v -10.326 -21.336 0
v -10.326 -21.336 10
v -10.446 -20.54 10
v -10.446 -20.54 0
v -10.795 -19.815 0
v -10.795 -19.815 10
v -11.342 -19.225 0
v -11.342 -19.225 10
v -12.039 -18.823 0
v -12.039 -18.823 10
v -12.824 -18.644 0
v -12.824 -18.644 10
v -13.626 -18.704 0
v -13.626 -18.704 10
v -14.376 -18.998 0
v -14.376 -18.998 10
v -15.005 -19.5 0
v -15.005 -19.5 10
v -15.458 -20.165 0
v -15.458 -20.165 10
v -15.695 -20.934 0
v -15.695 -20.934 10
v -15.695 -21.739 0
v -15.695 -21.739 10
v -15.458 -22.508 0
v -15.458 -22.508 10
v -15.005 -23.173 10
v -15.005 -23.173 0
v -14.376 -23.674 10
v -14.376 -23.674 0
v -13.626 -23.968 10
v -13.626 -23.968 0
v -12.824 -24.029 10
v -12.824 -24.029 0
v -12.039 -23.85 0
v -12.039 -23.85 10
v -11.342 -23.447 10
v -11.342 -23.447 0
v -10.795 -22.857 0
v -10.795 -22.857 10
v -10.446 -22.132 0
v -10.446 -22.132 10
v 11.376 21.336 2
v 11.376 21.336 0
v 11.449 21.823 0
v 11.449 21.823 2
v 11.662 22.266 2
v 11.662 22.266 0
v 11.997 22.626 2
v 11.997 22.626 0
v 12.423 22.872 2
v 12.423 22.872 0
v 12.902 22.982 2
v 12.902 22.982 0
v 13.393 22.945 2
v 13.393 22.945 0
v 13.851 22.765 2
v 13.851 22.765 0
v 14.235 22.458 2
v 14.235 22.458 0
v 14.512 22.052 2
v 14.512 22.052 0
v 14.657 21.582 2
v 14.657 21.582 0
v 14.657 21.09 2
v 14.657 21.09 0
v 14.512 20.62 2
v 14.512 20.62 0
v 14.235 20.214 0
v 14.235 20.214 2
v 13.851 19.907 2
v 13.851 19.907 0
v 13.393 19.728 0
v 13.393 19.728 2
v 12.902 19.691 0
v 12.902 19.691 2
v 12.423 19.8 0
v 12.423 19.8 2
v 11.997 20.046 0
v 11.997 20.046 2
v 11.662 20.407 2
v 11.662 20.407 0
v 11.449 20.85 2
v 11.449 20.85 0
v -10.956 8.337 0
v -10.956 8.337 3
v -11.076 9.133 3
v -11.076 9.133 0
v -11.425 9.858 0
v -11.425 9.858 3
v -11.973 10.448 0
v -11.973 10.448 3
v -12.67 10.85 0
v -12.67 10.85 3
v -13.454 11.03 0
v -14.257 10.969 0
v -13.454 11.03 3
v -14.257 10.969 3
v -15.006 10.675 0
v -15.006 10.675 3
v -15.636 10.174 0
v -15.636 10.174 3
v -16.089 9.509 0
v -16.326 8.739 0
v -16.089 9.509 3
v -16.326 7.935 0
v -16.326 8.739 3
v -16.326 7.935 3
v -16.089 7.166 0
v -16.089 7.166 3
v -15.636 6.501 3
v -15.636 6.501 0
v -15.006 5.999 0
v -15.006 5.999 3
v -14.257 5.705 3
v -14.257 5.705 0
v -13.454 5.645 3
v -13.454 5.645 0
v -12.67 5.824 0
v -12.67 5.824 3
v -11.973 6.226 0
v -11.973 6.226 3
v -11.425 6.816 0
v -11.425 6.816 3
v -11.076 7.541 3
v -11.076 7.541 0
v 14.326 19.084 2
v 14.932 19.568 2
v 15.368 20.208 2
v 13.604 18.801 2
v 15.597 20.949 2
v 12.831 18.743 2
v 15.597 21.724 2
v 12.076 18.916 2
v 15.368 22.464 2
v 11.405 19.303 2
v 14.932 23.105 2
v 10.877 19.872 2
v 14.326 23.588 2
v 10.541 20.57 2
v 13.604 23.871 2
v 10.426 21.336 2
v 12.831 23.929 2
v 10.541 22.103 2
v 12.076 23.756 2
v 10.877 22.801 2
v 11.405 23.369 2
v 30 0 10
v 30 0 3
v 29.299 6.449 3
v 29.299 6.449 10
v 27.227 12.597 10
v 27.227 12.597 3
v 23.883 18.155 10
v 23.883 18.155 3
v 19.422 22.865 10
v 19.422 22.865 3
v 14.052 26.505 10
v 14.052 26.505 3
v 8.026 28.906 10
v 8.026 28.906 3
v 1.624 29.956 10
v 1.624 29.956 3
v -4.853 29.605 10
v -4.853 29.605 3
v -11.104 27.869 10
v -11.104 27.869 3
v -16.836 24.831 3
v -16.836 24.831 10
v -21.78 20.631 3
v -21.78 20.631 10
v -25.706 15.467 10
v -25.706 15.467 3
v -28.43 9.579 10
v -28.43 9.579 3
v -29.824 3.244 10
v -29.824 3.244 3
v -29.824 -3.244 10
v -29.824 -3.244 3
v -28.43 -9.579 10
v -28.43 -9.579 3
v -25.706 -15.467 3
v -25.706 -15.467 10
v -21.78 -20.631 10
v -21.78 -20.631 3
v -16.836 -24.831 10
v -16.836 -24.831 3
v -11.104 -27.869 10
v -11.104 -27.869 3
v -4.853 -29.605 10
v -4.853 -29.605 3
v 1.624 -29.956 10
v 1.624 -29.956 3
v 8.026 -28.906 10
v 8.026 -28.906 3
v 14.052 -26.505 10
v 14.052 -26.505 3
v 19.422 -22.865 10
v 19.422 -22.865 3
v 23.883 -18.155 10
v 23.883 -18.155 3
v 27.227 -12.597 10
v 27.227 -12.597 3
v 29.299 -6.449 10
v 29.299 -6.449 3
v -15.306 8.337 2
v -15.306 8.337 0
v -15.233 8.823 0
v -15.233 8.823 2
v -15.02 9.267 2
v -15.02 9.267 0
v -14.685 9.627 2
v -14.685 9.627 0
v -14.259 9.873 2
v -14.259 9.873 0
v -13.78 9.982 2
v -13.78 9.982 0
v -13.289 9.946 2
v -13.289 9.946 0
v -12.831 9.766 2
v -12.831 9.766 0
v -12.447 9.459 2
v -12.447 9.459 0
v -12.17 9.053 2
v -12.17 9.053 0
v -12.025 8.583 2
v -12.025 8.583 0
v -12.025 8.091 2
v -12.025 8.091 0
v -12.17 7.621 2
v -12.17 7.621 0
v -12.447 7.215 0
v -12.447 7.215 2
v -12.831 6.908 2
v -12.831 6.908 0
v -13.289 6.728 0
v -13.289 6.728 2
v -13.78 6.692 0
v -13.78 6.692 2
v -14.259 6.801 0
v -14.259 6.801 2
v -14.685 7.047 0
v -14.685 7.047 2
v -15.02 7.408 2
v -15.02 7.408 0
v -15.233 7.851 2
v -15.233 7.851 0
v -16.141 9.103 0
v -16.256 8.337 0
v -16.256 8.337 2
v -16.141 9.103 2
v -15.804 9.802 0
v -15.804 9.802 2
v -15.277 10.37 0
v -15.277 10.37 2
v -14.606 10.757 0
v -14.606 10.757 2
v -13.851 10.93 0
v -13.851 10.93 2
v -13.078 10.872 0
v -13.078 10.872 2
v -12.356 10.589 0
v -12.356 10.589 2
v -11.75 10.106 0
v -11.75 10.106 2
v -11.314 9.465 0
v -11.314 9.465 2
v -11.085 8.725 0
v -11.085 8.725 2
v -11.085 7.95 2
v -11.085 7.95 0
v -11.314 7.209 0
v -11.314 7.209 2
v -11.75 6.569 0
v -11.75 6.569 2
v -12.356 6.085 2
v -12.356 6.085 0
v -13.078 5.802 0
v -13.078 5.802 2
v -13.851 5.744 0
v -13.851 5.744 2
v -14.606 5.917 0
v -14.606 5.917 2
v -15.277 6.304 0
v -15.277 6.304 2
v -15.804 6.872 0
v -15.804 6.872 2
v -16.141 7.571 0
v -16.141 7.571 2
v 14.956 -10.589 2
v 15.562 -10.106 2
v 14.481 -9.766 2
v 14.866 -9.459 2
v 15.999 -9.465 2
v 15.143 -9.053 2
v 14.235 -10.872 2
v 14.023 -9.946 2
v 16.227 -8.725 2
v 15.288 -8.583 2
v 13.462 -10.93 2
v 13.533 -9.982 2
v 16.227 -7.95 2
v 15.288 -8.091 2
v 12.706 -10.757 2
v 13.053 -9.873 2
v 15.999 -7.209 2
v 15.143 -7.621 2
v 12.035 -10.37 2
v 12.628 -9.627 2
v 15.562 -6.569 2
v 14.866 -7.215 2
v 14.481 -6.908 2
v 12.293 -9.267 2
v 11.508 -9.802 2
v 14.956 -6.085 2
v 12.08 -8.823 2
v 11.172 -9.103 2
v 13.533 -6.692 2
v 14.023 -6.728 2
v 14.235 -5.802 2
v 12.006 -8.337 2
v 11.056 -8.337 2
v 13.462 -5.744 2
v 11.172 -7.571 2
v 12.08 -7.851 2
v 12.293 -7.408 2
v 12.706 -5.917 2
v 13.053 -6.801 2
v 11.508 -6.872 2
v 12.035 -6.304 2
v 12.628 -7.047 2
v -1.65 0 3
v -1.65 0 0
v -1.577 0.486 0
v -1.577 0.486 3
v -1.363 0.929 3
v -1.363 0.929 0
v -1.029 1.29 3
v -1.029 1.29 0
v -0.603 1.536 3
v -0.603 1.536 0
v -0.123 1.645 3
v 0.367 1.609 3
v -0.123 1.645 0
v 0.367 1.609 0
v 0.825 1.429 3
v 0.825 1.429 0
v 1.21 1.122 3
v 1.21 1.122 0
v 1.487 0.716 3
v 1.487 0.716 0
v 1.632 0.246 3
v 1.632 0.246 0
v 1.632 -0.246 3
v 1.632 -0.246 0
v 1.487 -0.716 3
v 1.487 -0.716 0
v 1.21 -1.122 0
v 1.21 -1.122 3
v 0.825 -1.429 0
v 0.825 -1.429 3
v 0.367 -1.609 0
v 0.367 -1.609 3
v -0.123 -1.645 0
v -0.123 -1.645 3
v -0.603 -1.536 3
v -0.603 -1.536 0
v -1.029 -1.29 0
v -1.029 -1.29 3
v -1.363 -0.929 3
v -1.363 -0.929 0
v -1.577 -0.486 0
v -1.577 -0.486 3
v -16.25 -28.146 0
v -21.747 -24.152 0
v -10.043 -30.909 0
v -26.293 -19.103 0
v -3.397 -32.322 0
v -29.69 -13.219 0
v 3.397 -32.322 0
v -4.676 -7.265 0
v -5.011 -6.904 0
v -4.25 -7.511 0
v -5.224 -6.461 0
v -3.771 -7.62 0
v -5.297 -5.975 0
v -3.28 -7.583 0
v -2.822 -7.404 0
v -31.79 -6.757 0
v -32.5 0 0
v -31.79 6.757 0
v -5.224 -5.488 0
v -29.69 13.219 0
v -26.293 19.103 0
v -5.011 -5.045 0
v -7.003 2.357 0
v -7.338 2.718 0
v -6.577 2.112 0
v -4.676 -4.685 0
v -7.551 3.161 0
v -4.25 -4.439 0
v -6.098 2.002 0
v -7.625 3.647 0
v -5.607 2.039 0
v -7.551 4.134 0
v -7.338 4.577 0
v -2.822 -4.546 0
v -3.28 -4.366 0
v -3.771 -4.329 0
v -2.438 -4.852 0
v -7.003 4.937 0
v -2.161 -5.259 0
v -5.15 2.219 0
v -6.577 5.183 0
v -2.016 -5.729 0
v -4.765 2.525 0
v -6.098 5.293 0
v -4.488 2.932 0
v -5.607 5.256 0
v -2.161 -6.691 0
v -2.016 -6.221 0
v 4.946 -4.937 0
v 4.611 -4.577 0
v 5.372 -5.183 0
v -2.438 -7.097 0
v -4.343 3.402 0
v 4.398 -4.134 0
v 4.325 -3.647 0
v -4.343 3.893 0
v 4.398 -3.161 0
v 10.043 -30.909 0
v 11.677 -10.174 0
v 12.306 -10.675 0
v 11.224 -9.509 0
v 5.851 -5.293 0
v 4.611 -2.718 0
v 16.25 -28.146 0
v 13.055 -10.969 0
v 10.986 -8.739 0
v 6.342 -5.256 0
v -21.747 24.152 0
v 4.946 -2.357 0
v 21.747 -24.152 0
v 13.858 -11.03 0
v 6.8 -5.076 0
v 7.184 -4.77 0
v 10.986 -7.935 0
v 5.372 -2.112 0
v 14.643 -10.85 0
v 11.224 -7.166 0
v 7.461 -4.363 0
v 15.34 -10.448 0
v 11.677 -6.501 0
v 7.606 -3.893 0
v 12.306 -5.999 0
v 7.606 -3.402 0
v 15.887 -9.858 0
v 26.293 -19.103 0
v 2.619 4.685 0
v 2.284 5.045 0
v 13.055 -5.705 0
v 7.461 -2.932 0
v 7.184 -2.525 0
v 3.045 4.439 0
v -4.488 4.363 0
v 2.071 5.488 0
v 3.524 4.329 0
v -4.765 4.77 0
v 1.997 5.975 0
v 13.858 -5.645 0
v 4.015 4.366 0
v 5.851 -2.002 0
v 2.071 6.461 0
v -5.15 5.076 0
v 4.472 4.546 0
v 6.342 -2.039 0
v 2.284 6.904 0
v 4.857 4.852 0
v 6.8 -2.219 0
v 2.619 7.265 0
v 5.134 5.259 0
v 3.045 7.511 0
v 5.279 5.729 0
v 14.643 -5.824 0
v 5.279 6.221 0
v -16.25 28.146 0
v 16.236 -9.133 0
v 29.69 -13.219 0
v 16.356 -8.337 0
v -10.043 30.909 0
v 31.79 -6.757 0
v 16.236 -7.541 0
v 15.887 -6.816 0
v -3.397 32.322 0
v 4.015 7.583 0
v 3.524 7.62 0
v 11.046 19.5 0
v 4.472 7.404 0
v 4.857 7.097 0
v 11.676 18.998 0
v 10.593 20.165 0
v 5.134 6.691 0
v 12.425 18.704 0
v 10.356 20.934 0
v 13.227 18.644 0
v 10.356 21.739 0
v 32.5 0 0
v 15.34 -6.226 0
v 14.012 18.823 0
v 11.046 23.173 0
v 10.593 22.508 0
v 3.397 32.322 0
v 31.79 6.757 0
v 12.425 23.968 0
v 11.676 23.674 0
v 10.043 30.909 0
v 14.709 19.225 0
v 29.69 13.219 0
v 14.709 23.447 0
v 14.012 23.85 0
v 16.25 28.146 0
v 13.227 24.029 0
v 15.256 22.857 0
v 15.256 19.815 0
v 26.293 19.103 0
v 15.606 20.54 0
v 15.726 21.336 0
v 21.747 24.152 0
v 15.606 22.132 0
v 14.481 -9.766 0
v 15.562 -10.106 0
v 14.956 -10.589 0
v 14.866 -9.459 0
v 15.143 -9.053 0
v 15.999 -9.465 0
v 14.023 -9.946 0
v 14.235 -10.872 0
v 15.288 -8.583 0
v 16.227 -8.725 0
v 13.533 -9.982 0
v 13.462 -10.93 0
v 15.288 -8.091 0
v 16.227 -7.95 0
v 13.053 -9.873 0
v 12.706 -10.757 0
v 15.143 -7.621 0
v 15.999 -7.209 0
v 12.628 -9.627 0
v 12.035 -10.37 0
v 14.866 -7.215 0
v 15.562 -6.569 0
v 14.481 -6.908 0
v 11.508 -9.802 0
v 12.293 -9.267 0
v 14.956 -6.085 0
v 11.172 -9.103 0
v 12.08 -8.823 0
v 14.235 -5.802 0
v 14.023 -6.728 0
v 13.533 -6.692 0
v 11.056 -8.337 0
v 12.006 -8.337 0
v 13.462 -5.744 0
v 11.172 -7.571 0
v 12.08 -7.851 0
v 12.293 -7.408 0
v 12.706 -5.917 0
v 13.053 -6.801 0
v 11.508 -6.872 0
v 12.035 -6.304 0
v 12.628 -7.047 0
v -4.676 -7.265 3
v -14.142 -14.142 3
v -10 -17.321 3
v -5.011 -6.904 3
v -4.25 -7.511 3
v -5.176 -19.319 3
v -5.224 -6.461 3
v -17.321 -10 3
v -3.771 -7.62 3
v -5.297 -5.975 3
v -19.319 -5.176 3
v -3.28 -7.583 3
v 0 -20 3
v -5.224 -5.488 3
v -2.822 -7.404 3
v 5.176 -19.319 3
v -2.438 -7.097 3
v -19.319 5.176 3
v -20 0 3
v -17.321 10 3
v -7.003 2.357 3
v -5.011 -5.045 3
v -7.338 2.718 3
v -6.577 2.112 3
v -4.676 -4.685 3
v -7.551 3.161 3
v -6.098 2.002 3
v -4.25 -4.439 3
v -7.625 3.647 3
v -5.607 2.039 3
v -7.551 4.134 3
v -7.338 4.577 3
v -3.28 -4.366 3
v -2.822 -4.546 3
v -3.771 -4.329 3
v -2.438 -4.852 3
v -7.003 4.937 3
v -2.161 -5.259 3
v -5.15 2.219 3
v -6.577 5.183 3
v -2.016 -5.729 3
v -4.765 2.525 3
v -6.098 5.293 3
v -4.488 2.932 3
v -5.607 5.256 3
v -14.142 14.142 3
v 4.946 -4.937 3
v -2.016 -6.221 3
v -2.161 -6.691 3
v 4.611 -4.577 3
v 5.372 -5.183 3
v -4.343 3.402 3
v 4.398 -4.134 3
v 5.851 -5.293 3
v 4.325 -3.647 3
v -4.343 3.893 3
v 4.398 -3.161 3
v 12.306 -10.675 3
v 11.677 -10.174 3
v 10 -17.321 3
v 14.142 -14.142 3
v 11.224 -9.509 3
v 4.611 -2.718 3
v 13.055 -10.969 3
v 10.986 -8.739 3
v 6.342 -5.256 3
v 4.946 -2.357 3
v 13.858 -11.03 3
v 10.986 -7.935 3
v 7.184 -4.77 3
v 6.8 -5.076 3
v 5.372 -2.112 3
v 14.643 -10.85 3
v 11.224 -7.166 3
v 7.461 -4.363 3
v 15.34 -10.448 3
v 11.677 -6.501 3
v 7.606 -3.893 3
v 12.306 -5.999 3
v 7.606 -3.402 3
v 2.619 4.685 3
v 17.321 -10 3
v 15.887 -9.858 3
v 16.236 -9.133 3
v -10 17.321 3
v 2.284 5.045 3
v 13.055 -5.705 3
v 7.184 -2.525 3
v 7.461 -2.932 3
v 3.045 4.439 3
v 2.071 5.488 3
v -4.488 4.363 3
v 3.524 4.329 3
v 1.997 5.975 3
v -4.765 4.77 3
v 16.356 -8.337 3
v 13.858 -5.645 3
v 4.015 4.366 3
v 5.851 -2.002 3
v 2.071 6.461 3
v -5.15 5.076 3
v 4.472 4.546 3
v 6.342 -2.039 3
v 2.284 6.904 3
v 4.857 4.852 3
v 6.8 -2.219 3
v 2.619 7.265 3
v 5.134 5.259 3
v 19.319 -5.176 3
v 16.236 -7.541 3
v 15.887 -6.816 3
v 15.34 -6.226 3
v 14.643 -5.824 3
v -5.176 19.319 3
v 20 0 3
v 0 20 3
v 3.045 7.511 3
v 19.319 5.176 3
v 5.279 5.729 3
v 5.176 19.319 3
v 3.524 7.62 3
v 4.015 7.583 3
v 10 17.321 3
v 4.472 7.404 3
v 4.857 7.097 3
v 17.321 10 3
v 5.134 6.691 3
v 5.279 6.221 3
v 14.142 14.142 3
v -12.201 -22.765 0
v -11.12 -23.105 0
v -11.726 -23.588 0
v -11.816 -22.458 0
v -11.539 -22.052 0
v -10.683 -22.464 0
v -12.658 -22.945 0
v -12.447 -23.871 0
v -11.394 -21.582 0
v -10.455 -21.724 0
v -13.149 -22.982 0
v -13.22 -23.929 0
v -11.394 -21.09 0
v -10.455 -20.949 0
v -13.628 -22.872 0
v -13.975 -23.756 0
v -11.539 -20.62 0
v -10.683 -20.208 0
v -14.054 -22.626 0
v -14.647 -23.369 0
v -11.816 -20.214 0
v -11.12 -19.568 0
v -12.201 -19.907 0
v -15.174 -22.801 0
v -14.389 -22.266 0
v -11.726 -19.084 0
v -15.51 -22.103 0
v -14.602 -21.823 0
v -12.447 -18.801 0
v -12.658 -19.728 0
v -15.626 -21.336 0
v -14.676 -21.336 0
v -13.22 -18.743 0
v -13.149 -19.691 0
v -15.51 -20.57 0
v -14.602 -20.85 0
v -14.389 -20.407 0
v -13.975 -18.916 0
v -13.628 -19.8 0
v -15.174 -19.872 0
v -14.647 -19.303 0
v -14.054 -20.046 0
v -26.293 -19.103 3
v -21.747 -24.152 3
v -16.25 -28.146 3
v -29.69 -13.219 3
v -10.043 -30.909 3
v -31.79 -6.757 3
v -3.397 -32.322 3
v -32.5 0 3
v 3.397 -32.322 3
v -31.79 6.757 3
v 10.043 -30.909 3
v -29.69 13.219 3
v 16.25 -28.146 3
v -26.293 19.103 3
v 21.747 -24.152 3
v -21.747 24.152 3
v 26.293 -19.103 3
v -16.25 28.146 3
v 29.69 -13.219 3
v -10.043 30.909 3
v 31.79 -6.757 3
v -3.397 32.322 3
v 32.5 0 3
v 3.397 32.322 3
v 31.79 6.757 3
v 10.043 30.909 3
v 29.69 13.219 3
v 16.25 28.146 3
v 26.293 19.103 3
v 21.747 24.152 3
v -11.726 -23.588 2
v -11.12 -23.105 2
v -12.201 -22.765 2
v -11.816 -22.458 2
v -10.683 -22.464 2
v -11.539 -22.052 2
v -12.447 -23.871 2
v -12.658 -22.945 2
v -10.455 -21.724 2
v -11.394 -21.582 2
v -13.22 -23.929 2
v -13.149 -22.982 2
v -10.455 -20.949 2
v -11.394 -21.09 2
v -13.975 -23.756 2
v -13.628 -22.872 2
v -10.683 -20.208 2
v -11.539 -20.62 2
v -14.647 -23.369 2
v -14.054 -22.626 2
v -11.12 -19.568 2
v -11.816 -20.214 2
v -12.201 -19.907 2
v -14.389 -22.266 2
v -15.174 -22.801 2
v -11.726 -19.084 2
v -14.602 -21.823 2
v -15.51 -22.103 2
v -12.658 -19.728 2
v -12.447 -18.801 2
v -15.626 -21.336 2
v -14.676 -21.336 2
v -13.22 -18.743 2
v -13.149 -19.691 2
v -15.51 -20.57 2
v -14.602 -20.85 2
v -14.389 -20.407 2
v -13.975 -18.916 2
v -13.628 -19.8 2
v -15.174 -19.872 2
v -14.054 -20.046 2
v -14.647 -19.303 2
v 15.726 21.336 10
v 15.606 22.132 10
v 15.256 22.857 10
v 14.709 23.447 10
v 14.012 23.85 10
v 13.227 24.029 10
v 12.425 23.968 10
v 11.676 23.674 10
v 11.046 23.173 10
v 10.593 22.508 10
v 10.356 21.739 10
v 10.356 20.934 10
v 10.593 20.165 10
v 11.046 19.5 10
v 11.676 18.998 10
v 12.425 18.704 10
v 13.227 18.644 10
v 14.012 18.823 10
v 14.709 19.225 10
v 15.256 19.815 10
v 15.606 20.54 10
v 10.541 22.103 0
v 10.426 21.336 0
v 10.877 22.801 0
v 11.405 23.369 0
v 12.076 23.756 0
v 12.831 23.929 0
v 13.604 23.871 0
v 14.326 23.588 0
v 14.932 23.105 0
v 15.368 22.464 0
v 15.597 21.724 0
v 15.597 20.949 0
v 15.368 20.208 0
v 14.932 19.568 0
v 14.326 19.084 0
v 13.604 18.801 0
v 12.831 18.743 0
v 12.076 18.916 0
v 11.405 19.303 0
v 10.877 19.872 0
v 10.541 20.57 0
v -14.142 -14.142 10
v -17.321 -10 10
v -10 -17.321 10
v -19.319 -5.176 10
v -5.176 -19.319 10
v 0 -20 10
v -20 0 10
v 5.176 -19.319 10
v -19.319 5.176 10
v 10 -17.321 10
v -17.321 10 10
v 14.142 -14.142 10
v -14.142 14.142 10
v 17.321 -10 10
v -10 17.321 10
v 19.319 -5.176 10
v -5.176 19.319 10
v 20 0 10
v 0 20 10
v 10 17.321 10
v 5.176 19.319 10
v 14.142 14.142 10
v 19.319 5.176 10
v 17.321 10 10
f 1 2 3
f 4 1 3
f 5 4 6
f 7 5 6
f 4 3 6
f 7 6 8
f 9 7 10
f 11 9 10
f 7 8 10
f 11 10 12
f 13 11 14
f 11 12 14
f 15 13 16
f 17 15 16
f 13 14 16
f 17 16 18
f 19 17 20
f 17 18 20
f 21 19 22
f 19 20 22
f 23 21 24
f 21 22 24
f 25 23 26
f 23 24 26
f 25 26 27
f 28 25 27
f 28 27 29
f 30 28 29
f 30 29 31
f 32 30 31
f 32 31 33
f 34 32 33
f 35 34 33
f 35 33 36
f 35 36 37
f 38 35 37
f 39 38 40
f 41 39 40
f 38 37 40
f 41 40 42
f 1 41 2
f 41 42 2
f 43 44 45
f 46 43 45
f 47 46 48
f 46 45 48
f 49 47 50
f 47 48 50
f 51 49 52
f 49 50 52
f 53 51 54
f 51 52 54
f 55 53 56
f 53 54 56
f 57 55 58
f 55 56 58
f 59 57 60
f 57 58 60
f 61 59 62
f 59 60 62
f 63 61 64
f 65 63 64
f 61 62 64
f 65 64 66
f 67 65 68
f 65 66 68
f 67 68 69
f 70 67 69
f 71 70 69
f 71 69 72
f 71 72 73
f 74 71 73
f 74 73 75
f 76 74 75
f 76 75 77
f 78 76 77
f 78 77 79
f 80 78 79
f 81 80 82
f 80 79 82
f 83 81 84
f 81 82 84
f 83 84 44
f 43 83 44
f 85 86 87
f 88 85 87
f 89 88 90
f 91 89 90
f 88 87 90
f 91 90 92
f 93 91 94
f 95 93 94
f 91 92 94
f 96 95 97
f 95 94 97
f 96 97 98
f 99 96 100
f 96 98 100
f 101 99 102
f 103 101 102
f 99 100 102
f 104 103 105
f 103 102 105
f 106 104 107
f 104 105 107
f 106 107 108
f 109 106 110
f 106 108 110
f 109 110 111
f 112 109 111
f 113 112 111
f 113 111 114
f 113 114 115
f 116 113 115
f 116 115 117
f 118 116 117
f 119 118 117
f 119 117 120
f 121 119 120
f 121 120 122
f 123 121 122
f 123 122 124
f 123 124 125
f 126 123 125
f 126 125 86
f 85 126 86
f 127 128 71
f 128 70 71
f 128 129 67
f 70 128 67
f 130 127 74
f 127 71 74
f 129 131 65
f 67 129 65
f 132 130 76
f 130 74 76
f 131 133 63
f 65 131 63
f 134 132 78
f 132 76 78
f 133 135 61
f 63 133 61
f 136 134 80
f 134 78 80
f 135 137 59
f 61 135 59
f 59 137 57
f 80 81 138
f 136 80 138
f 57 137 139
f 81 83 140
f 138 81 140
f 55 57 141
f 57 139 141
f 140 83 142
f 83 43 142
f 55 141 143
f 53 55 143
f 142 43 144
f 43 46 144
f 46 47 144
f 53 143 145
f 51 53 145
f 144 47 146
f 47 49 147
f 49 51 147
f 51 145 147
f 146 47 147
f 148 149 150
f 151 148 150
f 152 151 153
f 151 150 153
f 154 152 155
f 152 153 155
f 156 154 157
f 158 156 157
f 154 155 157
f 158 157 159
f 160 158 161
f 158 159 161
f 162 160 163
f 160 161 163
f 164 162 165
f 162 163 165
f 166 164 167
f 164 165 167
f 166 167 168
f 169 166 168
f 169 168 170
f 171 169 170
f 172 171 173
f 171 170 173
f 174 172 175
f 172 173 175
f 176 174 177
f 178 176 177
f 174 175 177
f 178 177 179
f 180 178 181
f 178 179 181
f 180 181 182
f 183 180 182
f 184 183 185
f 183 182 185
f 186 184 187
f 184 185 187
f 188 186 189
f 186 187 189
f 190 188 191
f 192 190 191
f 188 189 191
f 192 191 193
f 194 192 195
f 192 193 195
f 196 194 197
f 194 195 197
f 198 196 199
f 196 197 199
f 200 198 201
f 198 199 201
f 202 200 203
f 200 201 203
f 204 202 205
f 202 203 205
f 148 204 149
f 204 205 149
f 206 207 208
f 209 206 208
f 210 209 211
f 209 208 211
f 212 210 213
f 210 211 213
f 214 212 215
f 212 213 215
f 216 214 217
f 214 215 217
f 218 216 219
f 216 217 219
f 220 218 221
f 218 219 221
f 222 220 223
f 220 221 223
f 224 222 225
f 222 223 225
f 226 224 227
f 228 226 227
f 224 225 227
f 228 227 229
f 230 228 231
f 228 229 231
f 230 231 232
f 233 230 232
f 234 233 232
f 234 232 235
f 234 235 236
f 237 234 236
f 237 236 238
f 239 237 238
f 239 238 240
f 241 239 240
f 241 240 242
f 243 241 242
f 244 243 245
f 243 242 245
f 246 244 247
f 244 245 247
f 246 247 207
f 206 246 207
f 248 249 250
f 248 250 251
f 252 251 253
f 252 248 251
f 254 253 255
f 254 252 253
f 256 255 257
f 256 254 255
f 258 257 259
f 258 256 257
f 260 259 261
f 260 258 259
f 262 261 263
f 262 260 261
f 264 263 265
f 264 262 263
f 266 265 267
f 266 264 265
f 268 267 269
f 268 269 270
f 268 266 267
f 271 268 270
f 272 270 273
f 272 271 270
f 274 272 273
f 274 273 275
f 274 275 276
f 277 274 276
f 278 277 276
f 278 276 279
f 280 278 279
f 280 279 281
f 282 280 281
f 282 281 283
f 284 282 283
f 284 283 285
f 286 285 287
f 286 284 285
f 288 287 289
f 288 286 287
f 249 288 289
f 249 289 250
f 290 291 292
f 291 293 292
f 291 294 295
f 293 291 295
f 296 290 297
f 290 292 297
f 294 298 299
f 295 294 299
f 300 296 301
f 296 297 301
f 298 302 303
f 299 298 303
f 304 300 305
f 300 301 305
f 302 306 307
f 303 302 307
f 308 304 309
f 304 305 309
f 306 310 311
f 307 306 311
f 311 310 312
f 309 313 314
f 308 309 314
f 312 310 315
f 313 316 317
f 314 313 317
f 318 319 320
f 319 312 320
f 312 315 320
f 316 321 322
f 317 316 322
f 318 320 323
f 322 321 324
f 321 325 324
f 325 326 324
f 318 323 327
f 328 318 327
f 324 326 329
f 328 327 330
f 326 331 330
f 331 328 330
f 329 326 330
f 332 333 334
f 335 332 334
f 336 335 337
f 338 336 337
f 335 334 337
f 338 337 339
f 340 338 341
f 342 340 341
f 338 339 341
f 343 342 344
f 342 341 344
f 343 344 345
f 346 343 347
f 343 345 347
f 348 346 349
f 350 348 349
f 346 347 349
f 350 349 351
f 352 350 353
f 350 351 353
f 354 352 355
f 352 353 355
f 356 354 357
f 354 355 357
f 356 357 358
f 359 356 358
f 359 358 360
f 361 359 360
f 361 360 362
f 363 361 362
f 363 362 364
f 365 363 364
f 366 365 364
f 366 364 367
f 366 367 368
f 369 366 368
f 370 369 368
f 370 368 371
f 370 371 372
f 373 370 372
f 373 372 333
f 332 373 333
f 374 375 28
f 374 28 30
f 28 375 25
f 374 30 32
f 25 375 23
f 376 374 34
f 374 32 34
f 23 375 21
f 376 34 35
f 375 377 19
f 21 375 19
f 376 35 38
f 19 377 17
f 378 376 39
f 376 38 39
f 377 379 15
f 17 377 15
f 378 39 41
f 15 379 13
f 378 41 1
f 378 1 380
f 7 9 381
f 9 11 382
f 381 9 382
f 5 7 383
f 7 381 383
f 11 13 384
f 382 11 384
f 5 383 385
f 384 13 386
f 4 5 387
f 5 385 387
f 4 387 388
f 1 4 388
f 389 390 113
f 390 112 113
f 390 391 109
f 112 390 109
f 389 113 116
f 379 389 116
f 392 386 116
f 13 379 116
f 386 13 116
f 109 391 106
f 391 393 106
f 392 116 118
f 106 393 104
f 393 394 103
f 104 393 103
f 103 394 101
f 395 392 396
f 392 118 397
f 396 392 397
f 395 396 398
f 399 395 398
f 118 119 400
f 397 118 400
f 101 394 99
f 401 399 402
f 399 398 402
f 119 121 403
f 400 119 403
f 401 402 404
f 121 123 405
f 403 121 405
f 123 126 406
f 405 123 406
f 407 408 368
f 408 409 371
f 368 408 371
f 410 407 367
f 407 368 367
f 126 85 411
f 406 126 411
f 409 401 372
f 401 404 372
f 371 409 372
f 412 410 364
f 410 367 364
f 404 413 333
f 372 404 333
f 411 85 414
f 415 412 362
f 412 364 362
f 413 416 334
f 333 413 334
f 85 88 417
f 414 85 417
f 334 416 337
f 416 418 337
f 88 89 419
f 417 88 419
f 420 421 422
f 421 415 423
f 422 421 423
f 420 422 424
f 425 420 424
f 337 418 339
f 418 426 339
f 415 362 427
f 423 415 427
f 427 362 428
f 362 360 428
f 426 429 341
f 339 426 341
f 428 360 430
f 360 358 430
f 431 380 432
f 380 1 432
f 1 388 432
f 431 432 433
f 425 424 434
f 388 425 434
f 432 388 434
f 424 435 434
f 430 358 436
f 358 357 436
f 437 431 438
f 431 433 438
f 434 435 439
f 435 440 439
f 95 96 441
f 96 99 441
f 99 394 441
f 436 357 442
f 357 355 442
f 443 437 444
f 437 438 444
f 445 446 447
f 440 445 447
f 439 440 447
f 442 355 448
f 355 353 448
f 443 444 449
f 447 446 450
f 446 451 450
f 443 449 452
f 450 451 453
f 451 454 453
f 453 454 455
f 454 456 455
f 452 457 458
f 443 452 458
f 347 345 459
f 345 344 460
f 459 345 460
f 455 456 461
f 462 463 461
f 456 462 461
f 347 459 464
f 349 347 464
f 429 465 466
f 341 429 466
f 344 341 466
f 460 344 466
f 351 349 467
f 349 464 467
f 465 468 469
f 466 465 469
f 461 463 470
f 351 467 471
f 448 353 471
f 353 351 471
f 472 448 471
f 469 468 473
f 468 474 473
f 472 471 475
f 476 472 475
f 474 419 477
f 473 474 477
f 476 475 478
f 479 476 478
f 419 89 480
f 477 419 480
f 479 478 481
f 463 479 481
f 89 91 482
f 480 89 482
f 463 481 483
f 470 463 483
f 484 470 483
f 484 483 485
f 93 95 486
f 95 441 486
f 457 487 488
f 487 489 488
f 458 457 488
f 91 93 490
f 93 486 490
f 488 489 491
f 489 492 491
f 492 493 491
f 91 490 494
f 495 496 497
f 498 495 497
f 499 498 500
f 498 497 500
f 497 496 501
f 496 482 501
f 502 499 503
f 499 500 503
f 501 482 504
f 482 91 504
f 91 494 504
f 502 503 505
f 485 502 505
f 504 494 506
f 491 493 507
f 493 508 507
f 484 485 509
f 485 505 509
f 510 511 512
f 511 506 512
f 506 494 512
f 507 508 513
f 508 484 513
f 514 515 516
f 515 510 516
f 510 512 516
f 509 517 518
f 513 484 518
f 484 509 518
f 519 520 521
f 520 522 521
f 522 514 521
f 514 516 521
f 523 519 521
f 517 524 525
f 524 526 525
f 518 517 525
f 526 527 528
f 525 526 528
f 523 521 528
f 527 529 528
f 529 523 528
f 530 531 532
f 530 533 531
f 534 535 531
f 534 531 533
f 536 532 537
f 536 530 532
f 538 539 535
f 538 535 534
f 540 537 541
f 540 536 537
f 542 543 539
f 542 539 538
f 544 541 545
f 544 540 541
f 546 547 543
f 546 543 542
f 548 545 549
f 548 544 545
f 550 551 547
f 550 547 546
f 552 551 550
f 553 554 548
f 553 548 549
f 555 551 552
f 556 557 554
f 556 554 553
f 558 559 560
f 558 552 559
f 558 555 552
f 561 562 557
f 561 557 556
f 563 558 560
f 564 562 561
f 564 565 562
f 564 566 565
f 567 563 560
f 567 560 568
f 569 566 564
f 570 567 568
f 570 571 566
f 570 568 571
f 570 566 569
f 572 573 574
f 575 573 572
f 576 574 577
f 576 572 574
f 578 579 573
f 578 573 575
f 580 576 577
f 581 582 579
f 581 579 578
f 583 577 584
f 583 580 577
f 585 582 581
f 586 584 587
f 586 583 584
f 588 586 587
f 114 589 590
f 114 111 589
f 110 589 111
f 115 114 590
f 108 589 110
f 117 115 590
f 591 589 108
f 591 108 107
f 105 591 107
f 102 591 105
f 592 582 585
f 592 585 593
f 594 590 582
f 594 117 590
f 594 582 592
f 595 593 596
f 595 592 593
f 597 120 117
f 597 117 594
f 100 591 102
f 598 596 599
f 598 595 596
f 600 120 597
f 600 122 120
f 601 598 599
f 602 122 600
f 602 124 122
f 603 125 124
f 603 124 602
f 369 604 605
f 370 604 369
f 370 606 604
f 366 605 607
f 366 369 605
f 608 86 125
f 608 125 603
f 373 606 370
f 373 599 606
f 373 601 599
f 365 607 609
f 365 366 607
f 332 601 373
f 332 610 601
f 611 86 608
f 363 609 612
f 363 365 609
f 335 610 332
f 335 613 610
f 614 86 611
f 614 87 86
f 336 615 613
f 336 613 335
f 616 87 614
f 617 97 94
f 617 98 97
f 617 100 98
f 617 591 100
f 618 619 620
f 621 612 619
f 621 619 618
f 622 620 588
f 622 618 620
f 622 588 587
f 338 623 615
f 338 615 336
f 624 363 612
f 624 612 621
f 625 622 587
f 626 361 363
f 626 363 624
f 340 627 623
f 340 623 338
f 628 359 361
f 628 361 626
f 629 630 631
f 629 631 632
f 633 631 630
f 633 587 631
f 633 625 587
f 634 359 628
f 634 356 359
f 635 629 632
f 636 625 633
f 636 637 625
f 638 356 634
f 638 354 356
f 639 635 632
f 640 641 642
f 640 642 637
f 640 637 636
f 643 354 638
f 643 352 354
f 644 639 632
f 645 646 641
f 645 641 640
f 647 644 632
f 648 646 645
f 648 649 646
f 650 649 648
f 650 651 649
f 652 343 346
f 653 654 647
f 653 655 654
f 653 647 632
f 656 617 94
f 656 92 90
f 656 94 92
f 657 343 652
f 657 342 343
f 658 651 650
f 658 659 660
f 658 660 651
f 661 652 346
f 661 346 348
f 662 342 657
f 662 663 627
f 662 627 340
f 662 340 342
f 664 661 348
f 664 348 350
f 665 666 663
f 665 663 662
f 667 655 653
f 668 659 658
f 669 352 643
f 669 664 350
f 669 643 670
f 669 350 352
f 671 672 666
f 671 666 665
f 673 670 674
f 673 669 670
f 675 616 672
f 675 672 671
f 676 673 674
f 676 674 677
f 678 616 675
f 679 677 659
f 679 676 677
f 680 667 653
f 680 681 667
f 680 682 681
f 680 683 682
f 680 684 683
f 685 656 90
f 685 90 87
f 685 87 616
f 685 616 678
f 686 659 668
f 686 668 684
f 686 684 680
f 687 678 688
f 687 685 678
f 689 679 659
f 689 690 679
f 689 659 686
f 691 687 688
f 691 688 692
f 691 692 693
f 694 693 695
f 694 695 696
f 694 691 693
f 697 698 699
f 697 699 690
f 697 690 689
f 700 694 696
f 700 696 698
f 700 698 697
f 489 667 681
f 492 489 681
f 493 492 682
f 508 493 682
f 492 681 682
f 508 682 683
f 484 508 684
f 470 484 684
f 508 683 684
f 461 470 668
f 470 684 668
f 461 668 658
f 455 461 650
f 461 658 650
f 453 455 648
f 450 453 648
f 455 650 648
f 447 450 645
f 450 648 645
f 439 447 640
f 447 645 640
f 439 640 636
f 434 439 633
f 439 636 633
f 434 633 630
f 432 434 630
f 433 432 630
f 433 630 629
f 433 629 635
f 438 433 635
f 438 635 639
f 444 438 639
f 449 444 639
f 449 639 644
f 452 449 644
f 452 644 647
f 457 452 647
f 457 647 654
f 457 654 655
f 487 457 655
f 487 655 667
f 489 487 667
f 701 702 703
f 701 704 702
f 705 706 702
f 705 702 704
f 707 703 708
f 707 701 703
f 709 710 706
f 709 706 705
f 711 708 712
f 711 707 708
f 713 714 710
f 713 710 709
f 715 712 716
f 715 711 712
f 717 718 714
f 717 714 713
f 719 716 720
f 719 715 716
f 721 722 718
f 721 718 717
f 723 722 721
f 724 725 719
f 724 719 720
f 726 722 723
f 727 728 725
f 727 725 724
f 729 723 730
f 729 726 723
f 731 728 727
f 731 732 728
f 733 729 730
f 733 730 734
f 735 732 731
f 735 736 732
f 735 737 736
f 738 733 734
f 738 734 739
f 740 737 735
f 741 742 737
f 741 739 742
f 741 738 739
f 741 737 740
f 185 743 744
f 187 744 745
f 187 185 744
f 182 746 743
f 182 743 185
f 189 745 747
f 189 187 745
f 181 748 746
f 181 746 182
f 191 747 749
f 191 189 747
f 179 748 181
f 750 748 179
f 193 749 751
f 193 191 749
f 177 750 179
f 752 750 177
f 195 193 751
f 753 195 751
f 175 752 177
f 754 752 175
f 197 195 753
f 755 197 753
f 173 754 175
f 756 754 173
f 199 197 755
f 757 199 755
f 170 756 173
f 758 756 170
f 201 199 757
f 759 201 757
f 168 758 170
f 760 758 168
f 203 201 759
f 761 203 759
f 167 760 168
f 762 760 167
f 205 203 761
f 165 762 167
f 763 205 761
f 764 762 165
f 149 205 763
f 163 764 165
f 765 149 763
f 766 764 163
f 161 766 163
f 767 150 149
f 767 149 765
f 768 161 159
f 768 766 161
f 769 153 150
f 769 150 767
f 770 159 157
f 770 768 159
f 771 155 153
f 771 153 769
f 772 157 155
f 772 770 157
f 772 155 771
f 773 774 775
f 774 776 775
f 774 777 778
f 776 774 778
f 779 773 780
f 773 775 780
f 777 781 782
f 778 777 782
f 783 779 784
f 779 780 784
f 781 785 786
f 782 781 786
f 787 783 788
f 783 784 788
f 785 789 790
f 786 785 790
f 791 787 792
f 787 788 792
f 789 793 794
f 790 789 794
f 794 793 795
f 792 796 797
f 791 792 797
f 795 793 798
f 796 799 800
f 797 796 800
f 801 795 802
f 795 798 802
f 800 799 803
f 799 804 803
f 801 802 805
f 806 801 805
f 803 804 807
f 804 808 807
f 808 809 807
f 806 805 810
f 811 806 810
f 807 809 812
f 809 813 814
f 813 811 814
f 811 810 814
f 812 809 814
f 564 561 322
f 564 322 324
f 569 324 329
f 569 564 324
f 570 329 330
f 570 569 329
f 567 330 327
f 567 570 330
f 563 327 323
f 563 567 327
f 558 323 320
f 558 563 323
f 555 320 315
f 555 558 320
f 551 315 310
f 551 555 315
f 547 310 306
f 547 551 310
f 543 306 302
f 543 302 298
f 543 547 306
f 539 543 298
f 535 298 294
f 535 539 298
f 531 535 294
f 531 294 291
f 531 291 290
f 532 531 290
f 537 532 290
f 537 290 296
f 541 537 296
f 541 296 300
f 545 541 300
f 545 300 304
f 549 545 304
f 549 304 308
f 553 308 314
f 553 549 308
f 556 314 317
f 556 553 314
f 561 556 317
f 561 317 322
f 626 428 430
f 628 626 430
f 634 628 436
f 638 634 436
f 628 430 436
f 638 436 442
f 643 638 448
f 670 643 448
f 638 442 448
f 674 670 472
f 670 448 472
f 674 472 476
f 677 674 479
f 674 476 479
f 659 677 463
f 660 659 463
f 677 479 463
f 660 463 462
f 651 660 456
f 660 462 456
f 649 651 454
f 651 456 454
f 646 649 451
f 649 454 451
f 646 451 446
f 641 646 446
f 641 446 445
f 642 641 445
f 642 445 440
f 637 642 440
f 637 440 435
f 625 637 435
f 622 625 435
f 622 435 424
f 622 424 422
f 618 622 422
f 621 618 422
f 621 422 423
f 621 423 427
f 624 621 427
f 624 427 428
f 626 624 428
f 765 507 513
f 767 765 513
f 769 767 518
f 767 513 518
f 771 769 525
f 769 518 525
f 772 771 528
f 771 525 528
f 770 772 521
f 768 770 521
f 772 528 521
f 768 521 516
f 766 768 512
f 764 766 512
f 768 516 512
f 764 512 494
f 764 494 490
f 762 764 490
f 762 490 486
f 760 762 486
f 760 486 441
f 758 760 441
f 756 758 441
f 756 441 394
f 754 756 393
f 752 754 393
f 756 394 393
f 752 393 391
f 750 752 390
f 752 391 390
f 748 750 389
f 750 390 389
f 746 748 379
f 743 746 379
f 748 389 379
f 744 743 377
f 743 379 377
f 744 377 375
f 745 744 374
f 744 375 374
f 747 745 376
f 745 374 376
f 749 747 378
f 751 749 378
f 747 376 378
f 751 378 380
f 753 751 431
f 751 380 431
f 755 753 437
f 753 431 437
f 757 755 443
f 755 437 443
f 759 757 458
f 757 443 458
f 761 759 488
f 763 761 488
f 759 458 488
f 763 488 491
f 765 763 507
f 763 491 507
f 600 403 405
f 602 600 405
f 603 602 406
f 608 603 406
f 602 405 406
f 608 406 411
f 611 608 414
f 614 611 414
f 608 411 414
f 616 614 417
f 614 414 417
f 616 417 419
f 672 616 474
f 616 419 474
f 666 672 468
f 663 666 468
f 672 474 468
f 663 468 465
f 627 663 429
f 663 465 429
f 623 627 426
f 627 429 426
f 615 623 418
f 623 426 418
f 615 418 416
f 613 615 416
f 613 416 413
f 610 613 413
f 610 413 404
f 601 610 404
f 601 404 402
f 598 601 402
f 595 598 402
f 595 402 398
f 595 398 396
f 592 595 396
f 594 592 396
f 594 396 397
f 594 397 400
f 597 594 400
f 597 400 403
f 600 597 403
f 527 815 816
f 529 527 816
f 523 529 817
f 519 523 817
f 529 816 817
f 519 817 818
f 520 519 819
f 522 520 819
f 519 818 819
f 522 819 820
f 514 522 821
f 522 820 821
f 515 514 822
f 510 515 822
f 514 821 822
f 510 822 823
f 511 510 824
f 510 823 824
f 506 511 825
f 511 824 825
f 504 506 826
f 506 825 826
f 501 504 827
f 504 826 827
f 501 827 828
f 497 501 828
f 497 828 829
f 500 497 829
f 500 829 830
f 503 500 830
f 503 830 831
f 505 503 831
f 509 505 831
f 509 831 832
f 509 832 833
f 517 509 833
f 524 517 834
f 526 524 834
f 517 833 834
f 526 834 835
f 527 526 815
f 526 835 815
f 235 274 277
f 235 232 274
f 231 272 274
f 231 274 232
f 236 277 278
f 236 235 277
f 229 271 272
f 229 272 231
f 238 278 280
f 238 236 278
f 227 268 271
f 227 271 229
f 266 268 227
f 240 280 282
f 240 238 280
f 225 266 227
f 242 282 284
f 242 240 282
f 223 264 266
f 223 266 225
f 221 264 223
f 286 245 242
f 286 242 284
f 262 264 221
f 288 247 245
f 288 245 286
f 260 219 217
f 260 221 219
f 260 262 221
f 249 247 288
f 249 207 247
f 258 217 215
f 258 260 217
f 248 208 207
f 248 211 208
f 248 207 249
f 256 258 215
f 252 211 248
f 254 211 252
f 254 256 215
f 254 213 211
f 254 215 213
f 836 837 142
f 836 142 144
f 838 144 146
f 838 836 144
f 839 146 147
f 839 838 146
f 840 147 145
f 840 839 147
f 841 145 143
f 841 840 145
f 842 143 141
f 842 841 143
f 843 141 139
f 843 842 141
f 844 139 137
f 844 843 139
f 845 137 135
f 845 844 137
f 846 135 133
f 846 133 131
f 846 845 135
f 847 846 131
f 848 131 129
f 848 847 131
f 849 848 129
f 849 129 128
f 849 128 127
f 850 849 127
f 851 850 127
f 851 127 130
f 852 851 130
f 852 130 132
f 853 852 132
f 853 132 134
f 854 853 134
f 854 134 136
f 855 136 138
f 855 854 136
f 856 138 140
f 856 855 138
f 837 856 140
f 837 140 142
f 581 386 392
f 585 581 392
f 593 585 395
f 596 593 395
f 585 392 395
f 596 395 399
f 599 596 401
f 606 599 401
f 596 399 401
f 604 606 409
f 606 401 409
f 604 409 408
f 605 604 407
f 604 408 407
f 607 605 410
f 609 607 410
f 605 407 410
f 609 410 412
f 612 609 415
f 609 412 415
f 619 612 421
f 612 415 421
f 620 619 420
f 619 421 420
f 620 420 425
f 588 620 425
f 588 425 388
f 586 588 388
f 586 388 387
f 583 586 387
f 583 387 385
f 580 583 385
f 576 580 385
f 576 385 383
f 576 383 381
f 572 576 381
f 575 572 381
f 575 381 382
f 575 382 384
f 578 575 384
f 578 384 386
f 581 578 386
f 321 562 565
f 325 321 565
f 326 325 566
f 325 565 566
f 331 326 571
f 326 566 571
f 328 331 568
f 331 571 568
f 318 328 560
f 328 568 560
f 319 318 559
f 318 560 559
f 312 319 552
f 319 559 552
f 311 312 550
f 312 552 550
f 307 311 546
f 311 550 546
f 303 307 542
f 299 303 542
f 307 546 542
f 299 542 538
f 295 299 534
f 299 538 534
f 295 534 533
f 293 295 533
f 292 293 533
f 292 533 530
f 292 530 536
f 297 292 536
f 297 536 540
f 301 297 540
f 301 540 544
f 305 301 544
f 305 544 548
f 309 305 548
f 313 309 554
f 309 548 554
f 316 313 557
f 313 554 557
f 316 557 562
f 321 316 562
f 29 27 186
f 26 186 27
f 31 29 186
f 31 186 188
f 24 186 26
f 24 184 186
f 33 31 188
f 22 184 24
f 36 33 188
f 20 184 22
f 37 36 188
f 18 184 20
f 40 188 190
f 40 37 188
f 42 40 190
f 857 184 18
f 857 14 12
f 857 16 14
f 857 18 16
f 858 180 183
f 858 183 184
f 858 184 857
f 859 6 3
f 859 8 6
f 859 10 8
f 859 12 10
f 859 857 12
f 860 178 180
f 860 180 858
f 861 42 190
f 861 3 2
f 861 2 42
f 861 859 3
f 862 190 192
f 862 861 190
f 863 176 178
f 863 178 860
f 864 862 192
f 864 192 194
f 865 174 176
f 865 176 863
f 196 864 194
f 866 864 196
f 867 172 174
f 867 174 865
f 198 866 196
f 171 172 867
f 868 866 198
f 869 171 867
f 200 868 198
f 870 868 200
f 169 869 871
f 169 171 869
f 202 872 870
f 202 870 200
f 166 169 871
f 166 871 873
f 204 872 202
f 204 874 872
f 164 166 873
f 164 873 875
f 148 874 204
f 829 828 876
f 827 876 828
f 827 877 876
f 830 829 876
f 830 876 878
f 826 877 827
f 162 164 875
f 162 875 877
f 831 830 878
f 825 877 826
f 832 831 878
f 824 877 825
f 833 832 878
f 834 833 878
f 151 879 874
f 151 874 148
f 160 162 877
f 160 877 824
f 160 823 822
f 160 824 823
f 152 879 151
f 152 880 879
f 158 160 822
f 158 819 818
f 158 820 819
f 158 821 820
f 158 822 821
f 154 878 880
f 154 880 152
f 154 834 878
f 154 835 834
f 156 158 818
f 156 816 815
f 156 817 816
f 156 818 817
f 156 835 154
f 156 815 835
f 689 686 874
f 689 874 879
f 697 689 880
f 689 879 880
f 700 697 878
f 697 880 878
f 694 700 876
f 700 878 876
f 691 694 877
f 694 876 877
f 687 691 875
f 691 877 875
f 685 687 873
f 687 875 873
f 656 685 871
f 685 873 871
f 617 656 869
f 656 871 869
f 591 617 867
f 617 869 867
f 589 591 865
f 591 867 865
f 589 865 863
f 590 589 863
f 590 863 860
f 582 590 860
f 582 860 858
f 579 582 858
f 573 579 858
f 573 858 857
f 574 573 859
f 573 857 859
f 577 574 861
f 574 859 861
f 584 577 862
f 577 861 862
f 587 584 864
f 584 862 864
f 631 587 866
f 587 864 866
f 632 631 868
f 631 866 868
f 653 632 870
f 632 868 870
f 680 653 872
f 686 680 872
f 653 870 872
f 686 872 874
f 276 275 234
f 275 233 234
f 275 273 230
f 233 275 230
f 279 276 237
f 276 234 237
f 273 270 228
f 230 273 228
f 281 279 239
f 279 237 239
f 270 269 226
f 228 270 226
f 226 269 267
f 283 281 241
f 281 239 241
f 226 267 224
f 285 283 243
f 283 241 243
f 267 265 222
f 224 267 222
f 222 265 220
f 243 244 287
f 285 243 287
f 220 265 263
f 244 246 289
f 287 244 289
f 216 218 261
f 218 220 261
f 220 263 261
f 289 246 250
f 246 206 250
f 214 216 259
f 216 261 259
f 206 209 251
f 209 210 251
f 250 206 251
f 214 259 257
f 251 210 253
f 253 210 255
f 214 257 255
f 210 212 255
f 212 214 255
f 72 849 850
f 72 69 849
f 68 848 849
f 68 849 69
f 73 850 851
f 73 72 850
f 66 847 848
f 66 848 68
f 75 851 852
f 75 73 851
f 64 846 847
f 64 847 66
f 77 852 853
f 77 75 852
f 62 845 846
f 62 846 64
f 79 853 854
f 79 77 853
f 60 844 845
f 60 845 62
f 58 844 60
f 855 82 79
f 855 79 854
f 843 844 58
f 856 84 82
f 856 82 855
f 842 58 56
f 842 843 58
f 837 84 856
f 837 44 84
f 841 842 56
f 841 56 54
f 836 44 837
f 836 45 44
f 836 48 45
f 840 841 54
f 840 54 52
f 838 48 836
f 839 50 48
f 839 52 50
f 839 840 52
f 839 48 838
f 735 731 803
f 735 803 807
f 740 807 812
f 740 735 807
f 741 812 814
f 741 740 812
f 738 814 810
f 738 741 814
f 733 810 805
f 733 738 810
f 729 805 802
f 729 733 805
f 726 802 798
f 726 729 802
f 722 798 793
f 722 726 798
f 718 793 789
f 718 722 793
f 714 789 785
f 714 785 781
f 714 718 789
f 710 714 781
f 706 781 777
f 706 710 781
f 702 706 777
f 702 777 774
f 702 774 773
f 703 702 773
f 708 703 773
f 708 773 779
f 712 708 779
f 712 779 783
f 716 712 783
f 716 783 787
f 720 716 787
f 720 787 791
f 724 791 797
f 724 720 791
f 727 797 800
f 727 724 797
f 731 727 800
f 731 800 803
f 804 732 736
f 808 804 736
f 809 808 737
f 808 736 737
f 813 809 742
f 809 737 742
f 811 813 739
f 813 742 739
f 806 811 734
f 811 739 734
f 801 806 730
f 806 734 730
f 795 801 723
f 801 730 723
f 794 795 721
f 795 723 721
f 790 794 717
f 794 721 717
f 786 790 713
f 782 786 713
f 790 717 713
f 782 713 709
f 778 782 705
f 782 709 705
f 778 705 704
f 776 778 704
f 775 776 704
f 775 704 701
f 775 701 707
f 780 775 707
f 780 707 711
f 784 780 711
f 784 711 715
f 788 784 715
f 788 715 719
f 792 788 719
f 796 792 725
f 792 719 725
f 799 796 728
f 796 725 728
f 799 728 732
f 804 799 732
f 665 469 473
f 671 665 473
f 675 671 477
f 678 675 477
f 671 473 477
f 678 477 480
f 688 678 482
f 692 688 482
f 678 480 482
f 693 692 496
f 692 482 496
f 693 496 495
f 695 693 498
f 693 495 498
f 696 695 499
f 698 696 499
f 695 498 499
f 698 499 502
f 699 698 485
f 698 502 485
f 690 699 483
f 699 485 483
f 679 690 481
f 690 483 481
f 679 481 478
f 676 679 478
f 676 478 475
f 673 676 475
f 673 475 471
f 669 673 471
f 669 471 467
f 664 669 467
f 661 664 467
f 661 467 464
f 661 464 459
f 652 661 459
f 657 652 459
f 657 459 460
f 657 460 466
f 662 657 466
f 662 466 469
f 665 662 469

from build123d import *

# Parameters (mm, degrees)
SKETCH_1_R          = 32.5
EXTRUDE_1_DEPTH     = 3
SKETCH_2_R          = 30
EXTRUDE_2_DEPTH     = 7
SKETCH_3_R          = 20
CUT_EXTRUDE_2_DEPTH = 7
SKETCH_4_R          = 2.7
CUT_EXTRUDE_3_DEPTH = 10
SKETCH_5_R          = 2.6
SKETCH_5_R_2        = 1.65
EXTRUDE_3_DEPTH     = 2
EXTRUDE_3_2_DEPTH   = 2
EXTRUDE_3_3_DEPTH   = 2
EXTRUDE_3_4_DEPTH   = 2
SKETCH_6_R          = 1.65
CUT_EXTRUDE_4_DEPTH = 10


with BuildPart() as part:
    # 草图1 → 凸台-拉伸1 (new body)
    with BuildSketch(Plane.XY):
        Circle(SKETCH_1_R)
    extrude(amount=EXTRUDE_1_DEPTH)

    # 草图2 → 凸台-拉伸2 (add)
    with BuildSketch(Plane.XY.offset(3)):
        Circle(SKETCH_2_R)
    extrude(amount=EXTRUDE_2_DEPTH)

    # 草图3 → 切除-拉伸2 (cut)
    with BuildSketch(Plane.XY.offset(10)):
        Circle(SKETCH_3_R)
    extrude(amount=-CUT_EXTRUDE_2_DEPTH, mode=Mode.SUBTRACT)

    # 草图4 → 切除-拉伸3 (cut)
    with BuildSketch(Plane.XY.offset(10)):
        with Locations((-13.025575957, -21.336163787)):
            Circle(SKETCH_4_R)
        with Locations((13.025575957, 21.336163787)):
            Circle(SKETCH_4_R)
        with Locations((13.656264529, -8.337052184)):
            Circle(SKETCH_4_R)
        with Locations((-13.656264529, 8.337052184)):
            Circle(SKETCH_4_R)
    extrude(amount=-CUT_EXTRUDE_3_DEPTH, mode=Mode.SUBTRACT)

    # 草图6 → 切除-拉伸4 (cut)
    with BuildSketch(Plane(origin=(0, 0, 0), x_dir=(-1, 0, 0), z_dir=(0, 0, -1))):
        Circle(SKETCH_6_R)
        with Locations((5.974615731, 3.647460331)):
            Circle(SKETCH_6_R)
        with Locations((3.647460331, -5.974615731)):
            Circle(SKETCH_6_R)
        with Locations((-5.974615731, -3.647460331)):
            Circle(SKETCH_6_R)
        with Locations((-3.647460331, 5.974615731)):
            Circle(SKETCH_6_R)
    extrude(amount=-CUT_EXTRUDE_4_DEPTH, mode=Mode.SUBTRACT)


with BuildPart() as body_2:
    # 草图5 → 凸台-拉伸3 (new body)
    with BuildSketch(Plane(origin=(0, 0, 0), x_dir=(-1, 0, 0), z_dir=(0, 0, -1))):
        with Locations((13.025575957, -21.336163787)):
            Circle(SKETCH_5_R)
        with Locations((13.025575957, -21.336163787)):
            Circle(SKETCH_5_R_2, mode=Mode.SUBTRACT)
    extrude(amount=-EXTRUDE_3_DEPTH)


with BuildPart() as body_3:
    # 草图5 → Extrude 3 2 (new body)
    with BuildSketch(Plane(origin=(0, 0, 0), x_dir=(-1, 0, 0), z_dir=(0, 0, -1))):
        with Locations((-13.025575957, 21.336163787)):
            Circle(SKETCH_5_R)
        with Locations((-13.025575957, 21.336163787)):
            Circle(SKETCH_5_R_2, mode=Mode.SUBTRACT)
    extrude(amount=-EXTRUDE_3_2_DEPTH)


with BuildPart() as body_4:
    # 草图5 → Extrude 3 3 (new body)
    with BuildSketch(Plane(origin=(0, 0, 0), x_dir=(-1, 0, 0), z_dir=(0, 0, -1))):
        with Locations((-13.656264529, -8.337052184)):
            Circle(SKETCH_5_R)
        with Locations((-13.656264529, -8.337052184)):
            Circle(SKETCH_5_R_2, mode=Mode.SUBTRACT)
    extrude(amount=-EXTRUDE_3_3_DEPTH)


with BuildPart() as body_5:
    # 草图5 → Extrude 3 4 (new body)
    with BuildSketch(Plane(origin=(0, 0, 0), x_dir=(-1, 0, 0), z_dir=(0, 0, -1))):
        with Locations((13.656264529, 8.337052184)):
            Circle(SKETCH_5_R)
        with Locations((13.656264529, 8.337052184)):
            Circle(SKETCH_5_R_2, mode=Mode.SUBTRACT)
    extrude(amount=-EXTRUDE_3_4_DEPTH)


solid = Compound([part.part, body_2.part, body_3.part, body_4.part, body_5.part])
